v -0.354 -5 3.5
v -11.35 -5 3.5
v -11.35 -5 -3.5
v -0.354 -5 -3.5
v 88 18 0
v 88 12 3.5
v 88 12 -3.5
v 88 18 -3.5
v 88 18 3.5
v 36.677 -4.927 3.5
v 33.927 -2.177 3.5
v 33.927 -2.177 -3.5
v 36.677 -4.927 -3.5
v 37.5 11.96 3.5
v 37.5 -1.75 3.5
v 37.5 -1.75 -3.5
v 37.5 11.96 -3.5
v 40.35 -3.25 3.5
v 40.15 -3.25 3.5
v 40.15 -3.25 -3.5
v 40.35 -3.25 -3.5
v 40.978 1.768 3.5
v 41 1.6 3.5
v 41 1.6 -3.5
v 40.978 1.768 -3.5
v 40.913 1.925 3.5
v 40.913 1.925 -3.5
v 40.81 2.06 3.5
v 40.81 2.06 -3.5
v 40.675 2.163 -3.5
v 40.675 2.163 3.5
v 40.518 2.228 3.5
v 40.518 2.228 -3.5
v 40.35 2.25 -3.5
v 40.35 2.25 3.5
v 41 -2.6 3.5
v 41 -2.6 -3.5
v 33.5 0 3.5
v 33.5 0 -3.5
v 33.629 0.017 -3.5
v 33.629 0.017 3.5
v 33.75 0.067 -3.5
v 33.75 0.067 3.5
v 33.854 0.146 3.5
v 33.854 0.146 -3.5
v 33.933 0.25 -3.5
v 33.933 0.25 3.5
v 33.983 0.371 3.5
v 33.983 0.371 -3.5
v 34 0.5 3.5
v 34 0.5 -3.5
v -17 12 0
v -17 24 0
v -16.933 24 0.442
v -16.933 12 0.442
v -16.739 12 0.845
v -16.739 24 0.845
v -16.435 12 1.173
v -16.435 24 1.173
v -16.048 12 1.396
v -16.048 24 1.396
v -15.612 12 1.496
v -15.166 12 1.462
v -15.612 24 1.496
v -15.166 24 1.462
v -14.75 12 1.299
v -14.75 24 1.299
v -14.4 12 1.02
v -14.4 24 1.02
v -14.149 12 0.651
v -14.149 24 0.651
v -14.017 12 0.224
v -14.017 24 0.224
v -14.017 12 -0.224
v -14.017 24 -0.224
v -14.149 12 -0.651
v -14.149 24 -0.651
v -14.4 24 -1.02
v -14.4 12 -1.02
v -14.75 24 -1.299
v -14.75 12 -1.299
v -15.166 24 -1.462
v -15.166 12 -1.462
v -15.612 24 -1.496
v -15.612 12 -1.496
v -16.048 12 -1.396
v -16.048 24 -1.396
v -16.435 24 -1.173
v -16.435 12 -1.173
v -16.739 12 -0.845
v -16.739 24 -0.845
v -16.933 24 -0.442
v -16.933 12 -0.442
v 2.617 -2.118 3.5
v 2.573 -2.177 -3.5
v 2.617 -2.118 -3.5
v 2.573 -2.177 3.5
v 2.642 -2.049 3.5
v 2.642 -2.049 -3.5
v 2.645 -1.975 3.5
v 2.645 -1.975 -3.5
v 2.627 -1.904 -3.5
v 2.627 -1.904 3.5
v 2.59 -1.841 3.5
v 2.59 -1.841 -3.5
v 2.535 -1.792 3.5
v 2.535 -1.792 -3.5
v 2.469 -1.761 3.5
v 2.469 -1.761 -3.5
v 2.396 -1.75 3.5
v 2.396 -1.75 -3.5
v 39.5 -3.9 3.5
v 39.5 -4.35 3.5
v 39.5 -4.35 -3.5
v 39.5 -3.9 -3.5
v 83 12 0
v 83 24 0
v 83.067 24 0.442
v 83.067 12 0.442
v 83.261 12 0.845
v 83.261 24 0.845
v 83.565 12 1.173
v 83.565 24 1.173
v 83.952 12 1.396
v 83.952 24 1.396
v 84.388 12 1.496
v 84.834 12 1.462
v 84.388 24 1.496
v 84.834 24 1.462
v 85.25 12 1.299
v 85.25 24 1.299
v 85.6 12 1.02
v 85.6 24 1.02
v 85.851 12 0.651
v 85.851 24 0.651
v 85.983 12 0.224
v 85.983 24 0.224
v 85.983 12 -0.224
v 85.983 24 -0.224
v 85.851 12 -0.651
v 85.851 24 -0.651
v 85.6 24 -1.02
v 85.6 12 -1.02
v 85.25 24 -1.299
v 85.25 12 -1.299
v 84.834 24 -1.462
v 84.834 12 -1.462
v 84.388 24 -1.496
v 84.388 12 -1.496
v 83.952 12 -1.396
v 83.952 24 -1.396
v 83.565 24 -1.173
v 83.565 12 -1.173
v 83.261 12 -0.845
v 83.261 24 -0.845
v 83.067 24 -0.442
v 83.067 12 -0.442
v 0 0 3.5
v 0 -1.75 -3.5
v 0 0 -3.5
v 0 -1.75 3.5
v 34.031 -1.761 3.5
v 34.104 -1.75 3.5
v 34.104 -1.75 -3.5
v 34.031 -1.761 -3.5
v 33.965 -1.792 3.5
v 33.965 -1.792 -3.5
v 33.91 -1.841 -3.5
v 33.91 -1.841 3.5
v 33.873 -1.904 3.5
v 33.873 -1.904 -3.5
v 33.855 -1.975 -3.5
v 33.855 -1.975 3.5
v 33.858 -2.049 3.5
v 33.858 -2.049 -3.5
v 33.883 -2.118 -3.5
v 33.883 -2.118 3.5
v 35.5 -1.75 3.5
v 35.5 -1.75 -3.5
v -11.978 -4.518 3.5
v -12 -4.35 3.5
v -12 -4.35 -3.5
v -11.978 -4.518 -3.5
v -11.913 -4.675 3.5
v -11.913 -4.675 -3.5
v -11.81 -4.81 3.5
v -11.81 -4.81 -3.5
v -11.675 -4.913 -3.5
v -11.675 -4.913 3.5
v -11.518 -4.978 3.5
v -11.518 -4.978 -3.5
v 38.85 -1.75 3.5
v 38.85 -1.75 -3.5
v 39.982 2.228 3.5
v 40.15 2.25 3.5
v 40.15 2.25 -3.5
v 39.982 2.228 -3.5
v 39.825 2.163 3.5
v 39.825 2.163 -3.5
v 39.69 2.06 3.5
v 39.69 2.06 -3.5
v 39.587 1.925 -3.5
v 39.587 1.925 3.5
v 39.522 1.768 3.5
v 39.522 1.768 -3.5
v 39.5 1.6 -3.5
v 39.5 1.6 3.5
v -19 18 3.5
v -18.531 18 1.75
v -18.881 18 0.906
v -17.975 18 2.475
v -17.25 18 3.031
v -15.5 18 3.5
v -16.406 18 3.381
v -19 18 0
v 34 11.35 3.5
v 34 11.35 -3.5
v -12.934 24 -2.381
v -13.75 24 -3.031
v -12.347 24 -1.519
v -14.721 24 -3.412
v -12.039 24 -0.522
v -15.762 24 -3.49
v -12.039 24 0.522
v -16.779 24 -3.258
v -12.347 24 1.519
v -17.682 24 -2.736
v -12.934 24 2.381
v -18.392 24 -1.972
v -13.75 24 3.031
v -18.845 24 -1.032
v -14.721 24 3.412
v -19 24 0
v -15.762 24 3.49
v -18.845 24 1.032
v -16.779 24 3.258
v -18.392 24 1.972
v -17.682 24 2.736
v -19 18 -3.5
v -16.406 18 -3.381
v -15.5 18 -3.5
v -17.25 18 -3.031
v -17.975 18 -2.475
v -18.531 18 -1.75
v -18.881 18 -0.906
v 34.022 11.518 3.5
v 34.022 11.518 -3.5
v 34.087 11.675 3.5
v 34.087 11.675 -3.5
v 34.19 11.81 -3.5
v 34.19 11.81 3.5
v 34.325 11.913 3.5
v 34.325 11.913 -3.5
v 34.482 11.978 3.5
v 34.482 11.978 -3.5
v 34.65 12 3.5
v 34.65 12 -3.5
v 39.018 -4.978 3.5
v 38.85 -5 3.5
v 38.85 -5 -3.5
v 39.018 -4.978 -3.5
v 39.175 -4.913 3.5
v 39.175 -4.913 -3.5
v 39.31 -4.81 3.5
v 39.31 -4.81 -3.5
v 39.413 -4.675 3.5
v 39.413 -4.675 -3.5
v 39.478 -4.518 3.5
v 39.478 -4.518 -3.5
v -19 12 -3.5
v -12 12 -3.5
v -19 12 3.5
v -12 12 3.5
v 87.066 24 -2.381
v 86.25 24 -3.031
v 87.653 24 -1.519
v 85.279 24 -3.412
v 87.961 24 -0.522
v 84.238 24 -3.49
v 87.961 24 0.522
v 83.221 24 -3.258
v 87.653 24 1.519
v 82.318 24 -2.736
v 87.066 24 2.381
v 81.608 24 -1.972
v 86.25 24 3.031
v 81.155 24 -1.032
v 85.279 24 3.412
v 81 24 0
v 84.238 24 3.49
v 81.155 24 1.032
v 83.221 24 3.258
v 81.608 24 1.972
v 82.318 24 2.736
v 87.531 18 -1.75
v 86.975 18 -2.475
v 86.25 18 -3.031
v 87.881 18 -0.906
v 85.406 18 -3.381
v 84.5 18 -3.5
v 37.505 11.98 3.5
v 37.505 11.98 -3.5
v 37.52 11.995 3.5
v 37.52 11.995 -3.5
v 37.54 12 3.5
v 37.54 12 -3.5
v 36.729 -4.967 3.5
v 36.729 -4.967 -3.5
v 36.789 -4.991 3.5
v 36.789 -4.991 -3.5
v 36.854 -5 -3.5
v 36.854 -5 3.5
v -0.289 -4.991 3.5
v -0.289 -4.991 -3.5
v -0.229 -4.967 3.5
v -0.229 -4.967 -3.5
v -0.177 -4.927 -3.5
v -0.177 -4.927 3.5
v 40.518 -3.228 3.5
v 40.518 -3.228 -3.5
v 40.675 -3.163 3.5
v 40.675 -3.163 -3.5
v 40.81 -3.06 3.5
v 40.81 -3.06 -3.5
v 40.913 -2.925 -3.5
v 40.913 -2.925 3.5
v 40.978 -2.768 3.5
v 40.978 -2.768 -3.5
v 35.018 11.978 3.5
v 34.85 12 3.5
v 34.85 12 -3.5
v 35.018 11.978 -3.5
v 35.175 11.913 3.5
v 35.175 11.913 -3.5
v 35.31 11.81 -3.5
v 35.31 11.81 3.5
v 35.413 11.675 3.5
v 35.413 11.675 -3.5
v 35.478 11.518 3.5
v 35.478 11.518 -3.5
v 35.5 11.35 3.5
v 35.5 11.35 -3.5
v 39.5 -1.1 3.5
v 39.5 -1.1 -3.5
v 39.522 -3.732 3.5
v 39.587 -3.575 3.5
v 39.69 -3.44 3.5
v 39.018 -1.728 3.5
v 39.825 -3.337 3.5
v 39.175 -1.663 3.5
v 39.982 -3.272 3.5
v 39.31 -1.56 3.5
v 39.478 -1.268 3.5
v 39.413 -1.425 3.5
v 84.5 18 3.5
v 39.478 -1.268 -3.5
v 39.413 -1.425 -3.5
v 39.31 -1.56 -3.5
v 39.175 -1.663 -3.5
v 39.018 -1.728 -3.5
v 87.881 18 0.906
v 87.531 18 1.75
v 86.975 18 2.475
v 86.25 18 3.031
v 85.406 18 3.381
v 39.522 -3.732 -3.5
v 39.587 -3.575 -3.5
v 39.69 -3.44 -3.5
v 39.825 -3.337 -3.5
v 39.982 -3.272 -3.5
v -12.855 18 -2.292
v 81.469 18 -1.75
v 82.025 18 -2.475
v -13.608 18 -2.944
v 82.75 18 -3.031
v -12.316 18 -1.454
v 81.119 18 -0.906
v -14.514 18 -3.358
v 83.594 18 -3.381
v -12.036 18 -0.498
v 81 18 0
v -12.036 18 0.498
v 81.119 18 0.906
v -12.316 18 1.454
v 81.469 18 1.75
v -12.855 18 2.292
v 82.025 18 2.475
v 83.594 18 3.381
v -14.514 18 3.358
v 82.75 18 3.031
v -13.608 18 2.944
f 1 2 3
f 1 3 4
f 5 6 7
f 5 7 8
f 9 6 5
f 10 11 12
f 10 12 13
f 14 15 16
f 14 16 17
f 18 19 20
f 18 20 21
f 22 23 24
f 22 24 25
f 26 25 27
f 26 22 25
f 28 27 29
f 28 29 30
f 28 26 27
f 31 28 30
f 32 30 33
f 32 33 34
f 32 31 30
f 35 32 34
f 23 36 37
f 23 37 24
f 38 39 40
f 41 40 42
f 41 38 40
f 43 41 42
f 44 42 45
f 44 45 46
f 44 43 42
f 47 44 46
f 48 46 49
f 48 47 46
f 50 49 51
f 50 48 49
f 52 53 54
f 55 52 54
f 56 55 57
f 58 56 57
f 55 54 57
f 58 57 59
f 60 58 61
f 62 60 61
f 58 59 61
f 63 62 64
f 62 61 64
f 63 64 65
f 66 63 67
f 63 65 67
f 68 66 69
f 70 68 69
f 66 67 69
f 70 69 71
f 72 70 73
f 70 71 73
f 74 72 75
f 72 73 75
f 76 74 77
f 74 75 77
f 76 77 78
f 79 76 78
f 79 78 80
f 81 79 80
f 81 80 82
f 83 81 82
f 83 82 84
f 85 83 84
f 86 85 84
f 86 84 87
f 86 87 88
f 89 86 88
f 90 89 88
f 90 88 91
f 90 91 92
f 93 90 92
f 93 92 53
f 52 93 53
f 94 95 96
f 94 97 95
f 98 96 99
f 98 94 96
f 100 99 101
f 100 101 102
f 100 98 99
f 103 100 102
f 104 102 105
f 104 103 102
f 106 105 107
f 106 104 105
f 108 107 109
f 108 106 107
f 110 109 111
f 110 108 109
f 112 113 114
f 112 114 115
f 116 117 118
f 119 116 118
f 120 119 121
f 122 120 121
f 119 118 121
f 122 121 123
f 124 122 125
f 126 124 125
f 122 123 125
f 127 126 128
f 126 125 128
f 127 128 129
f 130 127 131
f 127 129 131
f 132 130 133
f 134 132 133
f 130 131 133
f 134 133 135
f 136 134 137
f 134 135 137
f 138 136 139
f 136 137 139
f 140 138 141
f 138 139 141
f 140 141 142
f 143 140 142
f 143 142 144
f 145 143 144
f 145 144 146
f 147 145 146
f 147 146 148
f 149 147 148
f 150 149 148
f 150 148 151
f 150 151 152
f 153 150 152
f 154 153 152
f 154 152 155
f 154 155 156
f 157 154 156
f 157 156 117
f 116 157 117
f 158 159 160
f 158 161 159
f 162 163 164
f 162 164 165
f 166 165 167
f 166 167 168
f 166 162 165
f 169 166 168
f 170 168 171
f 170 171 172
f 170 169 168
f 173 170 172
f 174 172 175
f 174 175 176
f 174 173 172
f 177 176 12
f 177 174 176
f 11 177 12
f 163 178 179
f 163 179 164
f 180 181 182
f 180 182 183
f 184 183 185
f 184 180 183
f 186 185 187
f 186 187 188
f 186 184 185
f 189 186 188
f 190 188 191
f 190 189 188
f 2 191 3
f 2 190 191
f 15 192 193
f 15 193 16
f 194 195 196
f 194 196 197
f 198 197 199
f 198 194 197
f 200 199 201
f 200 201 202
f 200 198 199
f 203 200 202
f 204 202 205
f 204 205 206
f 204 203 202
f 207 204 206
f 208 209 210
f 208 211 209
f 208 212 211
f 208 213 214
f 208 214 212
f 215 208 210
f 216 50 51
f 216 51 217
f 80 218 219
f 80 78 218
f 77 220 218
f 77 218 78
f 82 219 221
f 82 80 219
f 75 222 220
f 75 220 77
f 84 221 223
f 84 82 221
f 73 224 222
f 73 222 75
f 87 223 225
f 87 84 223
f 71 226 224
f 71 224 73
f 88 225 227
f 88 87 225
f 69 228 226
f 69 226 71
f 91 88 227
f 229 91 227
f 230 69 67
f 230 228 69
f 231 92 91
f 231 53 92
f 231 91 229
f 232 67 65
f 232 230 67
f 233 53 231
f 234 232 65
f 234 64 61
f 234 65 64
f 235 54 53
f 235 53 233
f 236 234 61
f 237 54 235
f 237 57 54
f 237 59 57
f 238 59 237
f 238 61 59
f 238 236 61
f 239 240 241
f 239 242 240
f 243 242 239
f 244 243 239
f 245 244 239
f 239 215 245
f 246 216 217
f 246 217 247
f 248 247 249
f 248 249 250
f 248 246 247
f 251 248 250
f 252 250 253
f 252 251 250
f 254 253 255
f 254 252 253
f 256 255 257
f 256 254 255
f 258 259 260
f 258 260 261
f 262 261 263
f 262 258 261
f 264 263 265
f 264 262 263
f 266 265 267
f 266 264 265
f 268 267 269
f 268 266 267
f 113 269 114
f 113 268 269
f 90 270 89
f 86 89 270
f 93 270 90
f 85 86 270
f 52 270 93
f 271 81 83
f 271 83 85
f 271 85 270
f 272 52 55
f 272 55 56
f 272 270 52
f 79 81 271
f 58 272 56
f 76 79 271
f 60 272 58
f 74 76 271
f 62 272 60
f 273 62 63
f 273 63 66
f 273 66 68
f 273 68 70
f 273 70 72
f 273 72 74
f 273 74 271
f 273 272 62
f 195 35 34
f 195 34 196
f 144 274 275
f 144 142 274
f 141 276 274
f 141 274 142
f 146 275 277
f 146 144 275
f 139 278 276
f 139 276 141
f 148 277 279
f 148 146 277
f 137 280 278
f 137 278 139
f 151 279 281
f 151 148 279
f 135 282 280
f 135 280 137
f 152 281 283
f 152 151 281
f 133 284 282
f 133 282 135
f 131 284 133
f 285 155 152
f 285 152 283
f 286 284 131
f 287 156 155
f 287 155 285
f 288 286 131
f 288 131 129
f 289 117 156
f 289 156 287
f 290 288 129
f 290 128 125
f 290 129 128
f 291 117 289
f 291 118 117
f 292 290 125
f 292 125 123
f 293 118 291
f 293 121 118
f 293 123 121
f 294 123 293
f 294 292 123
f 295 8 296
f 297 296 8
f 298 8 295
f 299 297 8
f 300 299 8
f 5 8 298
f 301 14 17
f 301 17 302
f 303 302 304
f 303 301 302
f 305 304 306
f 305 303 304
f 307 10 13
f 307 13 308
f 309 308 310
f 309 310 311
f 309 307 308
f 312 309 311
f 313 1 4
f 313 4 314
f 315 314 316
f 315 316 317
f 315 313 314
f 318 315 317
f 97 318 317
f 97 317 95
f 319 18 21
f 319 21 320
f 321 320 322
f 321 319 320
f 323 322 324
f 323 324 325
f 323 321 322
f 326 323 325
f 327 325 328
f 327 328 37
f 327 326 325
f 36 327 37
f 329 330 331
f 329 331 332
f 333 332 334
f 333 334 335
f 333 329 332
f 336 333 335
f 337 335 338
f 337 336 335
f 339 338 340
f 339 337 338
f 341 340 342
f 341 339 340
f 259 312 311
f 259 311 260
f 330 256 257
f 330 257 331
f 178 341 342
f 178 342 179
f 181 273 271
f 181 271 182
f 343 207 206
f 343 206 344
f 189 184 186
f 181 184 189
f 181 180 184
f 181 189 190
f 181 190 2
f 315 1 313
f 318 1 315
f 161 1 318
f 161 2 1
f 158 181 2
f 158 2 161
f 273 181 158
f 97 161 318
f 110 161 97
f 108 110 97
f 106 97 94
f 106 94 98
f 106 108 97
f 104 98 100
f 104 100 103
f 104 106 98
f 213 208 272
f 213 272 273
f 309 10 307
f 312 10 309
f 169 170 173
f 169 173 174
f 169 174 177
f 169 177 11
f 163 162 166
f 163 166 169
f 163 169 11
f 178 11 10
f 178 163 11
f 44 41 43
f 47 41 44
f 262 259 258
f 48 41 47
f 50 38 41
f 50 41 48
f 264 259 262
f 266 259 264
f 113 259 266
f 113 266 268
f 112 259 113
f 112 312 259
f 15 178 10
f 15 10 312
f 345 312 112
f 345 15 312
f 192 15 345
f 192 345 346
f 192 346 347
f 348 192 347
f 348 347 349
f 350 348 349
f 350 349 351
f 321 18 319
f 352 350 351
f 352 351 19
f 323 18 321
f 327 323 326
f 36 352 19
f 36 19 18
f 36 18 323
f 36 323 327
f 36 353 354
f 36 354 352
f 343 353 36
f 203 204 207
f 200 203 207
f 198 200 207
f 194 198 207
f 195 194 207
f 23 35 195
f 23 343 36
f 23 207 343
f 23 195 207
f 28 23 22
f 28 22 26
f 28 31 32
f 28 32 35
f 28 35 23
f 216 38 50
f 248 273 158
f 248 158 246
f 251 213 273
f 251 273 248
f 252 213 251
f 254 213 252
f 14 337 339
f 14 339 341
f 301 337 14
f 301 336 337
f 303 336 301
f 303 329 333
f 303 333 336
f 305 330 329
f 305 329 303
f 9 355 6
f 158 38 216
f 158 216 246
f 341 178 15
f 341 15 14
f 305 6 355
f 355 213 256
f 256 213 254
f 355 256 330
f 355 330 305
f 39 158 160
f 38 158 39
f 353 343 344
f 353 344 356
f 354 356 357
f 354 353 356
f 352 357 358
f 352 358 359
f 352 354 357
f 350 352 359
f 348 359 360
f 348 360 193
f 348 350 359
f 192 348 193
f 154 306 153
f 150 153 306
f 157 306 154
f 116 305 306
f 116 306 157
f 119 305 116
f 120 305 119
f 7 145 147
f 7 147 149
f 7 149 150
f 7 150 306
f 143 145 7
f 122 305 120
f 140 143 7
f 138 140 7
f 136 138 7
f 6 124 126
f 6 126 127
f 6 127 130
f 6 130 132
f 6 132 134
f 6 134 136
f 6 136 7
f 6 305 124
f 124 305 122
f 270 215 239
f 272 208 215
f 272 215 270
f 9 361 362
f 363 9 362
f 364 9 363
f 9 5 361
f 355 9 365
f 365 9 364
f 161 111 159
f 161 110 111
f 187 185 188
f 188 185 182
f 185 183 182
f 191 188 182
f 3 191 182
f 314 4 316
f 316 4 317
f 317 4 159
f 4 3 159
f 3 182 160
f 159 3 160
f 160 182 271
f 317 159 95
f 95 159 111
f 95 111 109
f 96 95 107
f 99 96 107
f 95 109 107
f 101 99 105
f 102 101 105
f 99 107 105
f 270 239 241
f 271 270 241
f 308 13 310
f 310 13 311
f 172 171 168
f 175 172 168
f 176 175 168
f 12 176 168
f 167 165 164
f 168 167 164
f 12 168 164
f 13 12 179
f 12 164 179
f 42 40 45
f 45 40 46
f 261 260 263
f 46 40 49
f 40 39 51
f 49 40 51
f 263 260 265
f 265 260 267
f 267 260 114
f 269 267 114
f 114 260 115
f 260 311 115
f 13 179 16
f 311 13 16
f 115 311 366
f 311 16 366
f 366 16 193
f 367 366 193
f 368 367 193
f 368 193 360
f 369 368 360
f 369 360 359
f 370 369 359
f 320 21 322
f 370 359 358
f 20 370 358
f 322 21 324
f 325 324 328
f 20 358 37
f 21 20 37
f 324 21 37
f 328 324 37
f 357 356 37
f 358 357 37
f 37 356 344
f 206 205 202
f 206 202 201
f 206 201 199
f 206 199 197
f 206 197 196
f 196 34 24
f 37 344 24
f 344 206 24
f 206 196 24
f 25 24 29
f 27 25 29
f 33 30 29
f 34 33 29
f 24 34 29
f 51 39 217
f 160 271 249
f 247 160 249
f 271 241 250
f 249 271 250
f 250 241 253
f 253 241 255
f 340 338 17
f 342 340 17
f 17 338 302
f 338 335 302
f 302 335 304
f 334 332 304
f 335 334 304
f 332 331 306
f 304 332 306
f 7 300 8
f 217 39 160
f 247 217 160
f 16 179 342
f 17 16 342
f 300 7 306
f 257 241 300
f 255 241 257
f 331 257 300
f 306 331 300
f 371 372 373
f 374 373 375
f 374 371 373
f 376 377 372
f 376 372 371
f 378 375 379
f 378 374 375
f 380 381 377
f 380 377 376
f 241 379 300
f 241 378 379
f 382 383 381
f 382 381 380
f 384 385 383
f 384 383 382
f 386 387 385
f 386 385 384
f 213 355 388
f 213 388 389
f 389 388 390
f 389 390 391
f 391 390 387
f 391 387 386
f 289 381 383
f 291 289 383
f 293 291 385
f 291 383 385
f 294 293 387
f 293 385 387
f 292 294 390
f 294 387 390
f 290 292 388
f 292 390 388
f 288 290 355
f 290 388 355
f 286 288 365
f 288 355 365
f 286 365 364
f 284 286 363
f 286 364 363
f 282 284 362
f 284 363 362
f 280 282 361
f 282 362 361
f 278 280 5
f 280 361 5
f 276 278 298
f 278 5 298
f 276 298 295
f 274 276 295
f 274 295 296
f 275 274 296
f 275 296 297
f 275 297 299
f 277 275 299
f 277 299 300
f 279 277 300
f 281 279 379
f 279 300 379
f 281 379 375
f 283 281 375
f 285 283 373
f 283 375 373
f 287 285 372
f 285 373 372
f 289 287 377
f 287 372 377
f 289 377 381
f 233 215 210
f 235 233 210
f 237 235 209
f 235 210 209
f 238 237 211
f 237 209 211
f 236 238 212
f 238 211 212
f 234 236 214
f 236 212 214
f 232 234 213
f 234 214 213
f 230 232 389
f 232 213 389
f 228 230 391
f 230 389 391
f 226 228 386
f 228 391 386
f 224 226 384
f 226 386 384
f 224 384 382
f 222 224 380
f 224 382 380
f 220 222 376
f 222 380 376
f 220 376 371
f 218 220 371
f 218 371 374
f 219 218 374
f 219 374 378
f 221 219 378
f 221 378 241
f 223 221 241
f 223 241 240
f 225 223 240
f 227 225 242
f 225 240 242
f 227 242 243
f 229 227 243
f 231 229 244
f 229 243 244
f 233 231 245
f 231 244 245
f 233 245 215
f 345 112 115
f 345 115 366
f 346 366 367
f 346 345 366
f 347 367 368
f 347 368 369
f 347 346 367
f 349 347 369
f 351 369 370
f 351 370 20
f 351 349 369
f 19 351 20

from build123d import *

# Parameters (mm, degrees)
F1_DEPTH = 3.5
F2_R     = 3.5
F3_DEPTH = 6
F4_R     = 1.5
F5_DEPTH = 29.001


with BuildPart() as f1:
    # F0 (on Top) → F1 (new body, symmetric)
    with BuildSketch(Plane.XY):
        with BuildLine():
            Line((0, -1.75), (0, 0))
            Line((0, 0), (33.5, 0))
            ThreePointArc((33.5, 0), (33.8535533906, 0.1464466094), (34, 0.5))
            Line((34, 0.5), (34, 11.35))
            ThreePointArc((34, 11.35), (34.1903805922, 11.8096194078), (34.65, 12))
            Line((34.65, 12), (34.85, 12))
            ThreePointArc((34.85, 12), (35.3096194078, 11.8096194078), (35.5, 11.35))
            Line((35.5, 11.35), (35.5, -1.75))
            Line((35.5, -1.75), (34.1035533906, -1.75))
            ThreePointArc((34.1035533906, -1.75), (33.8725835075, -1.9043291419), (33.9267766953, -2.1767766953))
            Line((33.9267766953, -2.1767766953), (36.6767766953, -4.9267766953))
            ThreePointArc((36.6767766953, -4.9267766953), (36.7578825325, -4.9809698831), (36.8535533906, -5))
            Line((36.8535533906, -5), (38.85, -5))
            ThreePointArc((38.85, -5), (39.3096194078, -4.8096194078), (39.5, -4.35))
            Line((39.5, -4.35), (39.5, -3.9))
            ThreePointArc((39.5, -3.9), (39.6903805922, -3.4403805922), (40.15, -3.25))
            Line((40.15, -3.25), (40.35, -3.25))
            ThreePointArc((40.35, -3.25), (40.8096194078, -3.0596194078), (41, -2.6))
            Line((41, -2.6), (41, 1.6))
            ThreePointArc((41, 1.6), (40.8096194078, 2.0596194078), (40.35, 2.25))
            Line((40.35, 2.25), (40.15, 2.25))
            ThreePointArc((40.15, 2.25), (39.6903805922, 2.0596194078), (39.5, 1.6))
            Line((39.5, 1.6), (39.5, -1.1))
            ThreePointArc((39.5, -1.1), (39.3096194078, -1.5596194078), (38.85, -1.75))
            Line((38.85, -1.75), (37.5, -1.75))
            Line((37.5, -1.75), (37.5, 11.96))
            ThreePointArc((37.5, 11.96), (37.5117157288, 11.9882842712), (37.54, 12))
            Line((37.54, 12), (88, 12))
            Line((88, 12), (88, 18))
            Line((88, 18), (-19, 18))
            Line((-19, 18), (-19, 12))
            Line((-19, 12), (-12, 12))
            Line((-12, 12), (-12, -4.35))
            ThreePointArc((-12, -4.35), (-11.8096194078, -4.8096194078), (-11.35, -5))
            Line((-11.35, -5), (-0.3535533906, -5))
            ThreePointArc((-0.3535533906, -5), (-0.2578825325, -4.9809698831), (-0.1767766953, -4.9267766953))
            Line((-0.1767766953, -4.9267766953), (2.5732233047, -2.1767766953))
            ThreePointArc((2.5732233047, -2.1767766953), (2.6274164925, -1.9043291419), (2.3964466094, -1.75))
            Line((2.3964466094, -1.75), (0, -1.75))
        make_face()
    extrude(amount=F1_DEPTH, both=True)

    # F2 (on face) → F3 (join)
    with BuildSketch(Plane(origin=(0, 18, 0), x_dir=(-1, 0, 0), z_dir=(0, 1, 0))):
        with Locations((-84.5, 0)):
            Circle(F2_R)
        with Locations((15.5, 0)):
            Circle(F2_R)
    extrude(amount=F3_DEPTH)

    # F4 (on face) → F5 (cut, through all)
    with BuildSketch(Plane(origin=(0, 24, 0), x_dir=(-1, 0, 0), z_dir=(0, 1, 0))):
        with Locations((-84.5, 0)):
            Circle(F4_R)
        with Locations((15.5, 0)):
            Circle(F4_R)
    extrude(amount=-F5_DEPTH, mode=Mode.SUBTRACT)


solid = f1.part
